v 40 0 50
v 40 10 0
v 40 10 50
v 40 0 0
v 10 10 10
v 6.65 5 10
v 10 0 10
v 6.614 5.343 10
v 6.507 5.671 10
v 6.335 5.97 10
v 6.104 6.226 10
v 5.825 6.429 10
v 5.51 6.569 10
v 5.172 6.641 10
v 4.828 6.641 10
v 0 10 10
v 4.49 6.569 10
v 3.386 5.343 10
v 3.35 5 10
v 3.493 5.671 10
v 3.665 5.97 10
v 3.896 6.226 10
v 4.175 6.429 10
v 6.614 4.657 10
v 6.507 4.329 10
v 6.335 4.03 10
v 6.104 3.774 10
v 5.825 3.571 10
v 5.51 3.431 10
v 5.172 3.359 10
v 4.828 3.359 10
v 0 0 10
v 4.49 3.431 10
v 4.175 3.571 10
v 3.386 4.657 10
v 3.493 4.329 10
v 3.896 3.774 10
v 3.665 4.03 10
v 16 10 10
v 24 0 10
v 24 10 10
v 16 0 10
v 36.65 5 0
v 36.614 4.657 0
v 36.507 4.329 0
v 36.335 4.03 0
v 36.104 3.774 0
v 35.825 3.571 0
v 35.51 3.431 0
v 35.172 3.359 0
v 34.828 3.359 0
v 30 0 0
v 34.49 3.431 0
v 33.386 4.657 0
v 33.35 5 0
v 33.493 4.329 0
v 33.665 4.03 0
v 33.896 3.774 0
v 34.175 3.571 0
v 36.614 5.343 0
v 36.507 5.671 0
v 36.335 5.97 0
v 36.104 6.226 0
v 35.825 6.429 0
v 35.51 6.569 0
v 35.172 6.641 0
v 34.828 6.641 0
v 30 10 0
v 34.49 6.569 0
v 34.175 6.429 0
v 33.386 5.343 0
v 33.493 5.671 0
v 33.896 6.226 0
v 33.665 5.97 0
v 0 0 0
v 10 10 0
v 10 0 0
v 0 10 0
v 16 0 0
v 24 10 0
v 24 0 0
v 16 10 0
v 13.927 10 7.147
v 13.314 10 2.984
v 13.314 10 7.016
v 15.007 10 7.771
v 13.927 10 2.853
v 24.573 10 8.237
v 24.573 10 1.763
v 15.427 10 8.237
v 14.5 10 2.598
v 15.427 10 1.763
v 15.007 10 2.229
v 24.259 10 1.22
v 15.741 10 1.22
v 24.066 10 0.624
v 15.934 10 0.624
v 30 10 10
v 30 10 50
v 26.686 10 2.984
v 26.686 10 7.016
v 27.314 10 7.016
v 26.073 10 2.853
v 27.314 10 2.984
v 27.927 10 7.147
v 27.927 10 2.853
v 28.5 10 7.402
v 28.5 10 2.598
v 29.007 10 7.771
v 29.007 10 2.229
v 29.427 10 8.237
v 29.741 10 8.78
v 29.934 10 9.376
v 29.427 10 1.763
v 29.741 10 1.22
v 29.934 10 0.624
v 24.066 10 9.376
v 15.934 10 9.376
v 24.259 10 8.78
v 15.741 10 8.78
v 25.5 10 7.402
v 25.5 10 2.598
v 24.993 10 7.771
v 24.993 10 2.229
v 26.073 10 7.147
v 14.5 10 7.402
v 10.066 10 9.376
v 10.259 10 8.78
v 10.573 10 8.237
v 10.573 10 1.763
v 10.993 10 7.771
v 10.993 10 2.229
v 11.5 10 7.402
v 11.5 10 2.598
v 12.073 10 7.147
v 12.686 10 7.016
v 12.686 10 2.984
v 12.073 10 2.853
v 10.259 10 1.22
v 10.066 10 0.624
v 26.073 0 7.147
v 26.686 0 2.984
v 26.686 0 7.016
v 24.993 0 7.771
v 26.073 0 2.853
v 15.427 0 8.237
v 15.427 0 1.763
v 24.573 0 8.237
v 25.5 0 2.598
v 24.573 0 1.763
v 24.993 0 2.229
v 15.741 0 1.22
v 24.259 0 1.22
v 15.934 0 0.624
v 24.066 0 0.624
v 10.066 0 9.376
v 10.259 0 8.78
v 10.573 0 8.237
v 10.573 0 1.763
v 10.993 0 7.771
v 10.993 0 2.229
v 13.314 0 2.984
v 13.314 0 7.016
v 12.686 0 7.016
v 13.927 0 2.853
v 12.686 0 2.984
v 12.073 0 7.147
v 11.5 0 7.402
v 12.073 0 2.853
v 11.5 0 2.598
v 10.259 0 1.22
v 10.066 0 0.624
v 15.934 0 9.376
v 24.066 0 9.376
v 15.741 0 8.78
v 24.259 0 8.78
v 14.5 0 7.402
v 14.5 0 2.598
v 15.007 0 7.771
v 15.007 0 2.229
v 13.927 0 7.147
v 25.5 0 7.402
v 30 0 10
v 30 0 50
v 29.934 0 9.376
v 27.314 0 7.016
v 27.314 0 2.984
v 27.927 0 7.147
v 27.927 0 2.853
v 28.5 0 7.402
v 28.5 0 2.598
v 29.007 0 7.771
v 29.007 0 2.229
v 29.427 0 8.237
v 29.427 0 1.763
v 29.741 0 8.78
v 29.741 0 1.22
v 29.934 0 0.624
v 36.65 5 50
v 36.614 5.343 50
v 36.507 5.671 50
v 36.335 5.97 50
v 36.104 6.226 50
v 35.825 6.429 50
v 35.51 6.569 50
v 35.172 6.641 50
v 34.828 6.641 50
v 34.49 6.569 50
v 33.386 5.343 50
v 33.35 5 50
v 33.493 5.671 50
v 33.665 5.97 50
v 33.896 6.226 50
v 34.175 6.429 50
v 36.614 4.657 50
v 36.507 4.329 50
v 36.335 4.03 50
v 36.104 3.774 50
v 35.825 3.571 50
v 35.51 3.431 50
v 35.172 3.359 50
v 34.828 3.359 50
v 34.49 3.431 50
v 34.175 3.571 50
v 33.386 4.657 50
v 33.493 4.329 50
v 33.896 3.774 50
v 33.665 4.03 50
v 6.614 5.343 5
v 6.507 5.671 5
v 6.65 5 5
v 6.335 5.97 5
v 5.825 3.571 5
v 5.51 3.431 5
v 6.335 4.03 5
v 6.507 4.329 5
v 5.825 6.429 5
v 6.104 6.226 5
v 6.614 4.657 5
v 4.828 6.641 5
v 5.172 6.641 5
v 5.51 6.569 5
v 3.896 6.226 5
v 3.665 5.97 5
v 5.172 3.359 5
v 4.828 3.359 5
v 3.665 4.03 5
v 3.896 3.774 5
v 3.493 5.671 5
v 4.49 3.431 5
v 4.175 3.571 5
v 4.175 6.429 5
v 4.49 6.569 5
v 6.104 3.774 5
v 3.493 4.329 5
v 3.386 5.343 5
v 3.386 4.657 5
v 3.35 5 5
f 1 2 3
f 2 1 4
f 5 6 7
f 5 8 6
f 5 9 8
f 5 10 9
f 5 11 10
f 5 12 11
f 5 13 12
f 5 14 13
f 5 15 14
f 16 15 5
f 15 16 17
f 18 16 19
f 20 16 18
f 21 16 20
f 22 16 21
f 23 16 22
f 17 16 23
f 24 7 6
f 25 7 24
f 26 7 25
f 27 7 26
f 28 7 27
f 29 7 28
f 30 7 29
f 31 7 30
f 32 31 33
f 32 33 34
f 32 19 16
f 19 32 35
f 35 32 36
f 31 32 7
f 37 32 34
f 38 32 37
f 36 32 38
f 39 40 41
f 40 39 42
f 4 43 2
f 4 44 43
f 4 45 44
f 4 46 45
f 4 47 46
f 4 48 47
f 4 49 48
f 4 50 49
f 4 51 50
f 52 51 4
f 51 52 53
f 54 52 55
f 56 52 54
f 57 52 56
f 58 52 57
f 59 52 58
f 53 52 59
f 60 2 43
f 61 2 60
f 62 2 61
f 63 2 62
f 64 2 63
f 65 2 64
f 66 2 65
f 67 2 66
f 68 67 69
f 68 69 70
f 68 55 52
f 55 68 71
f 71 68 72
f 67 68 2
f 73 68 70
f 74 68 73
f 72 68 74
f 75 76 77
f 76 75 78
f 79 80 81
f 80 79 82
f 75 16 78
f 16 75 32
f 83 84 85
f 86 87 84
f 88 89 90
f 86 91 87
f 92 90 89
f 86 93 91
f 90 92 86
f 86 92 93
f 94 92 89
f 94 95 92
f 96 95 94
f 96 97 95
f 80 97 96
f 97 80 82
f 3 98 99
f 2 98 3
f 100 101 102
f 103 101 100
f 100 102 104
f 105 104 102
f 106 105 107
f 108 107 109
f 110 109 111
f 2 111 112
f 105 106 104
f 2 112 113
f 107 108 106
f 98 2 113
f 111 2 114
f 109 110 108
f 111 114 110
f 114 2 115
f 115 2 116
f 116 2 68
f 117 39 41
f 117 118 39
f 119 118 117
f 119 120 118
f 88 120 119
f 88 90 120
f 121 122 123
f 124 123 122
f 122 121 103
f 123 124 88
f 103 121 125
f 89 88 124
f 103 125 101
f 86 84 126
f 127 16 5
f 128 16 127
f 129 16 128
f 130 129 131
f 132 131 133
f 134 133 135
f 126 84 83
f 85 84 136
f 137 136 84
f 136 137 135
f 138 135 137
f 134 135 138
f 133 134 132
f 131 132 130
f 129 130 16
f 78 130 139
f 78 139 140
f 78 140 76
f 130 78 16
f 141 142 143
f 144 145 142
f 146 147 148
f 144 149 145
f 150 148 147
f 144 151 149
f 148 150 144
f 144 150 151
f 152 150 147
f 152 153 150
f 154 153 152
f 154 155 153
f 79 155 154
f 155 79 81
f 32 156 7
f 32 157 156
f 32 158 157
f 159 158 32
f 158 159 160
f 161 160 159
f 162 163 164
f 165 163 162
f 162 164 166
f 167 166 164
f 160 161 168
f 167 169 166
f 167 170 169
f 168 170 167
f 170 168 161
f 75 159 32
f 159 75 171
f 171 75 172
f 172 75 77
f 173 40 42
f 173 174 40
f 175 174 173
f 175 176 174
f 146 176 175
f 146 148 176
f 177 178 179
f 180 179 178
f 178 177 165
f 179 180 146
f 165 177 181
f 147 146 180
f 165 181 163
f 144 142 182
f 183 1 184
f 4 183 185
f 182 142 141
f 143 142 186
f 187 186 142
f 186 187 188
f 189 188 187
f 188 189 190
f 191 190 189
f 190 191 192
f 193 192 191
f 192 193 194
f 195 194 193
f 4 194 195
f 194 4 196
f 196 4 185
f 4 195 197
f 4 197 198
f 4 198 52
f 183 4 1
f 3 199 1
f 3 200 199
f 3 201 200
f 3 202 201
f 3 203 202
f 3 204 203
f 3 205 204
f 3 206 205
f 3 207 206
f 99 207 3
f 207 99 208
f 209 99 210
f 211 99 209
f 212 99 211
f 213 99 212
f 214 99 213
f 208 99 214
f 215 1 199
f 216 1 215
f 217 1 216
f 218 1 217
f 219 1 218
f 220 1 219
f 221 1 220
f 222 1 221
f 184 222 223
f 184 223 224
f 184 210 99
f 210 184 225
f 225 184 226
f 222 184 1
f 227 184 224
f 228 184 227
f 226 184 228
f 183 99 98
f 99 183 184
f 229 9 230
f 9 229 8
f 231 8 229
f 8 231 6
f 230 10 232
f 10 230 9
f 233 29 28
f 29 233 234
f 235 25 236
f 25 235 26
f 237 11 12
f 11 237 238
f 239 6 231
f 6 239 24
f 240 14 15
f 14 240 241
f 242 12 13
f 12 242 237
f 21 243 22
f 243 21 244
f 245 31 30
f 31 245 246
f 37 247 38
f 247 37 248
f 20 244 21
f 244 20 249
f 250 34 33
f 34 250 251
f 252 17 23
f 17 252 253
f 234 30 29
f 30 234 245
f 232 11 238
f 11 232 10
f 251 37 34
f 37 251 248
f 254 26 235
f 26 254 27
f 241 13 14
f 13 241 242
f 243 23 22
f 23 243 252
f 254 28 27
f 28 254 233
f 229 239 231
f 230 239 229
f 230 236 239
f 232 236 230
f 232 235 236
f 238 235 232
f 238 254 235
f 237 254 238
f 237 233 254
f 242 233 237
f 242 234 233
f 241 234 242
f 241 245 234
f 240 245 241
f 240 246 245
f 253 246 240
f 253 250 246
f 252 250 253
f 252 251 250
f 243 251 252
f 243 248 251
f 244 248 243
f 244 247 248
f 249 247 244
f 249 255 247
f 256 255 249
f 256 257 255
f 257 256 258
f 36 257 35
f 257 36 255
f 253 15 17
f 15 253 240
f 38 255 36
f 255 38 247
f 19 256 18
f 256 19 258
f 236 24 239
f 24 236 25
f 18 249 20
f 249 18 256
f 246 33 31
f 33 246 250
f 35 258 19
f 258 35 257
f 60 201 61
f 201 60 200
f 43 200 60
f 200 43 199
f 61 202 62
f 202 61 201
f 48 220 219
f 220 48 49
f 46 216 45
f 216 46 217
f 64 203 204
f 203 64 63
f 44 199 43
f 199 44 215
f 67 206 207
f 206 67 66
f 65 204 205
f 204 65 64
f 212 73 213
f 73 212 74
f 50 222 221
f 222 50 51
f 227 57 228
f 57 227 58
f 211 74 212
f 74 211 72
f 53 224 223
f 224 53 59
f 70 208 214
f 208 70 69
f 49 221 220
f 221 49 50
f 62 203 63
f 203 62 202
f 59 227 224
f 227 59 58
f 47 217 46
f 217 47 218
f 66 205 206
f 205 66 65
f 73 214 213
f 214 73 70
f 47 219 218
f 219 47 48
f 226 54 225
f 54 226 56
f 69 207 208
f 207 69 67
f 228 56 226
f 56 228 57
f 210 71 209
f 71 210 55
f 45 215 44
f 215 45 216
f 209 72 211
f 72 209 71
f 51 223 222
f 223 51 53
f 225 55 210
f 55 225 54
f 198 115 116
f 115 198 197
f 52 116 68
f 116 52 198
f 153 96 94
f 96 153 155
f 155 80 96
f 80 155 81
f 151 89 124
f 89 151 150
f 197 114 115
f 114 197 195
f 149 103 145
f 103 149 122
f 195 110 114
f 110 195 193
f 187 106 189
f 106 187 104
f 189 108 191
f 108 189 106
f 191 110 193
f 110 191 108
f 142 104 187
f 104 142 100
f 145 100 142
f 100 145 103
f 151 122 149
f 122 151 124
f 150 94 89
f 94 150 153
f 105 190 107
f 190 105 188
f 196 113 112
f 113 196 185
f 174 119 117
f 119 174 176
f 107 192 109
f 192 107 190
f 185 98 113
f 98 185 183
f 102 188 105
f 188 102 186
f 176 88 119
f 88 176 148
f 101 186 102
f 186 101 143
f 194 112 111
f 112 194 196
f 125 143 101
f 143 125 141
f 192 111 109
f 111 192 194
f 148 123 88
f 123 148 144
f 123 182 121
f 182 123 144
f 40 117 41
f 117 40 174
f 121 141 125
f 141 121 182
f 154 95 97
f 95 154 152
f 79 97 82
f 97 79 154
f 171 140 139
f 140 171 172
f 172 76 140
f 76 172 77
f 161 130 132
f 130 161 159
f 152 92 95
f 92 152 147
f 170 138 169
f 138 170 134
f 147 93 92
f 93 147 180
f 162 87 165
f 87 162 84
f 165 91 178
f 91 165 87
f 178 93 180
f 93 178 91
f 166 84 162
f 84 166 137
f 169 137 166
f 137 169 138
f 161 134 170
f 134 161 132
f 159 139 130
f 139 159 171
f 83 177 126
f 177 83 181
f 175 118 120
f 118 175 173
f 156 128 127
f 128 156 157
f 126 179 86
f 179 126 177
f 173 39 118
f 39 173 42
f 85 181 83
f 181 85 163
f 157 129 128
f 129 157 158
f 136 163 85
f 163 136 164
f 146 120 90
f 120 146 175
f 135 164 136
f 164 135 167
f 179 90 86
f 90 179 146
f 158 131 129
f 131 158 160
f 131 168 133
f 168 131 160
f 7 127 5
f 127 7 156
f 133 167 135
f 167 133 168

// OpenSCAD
$fn=30;
legth=40;
width=10;
height=10;
difference(){
    union(){
        cube([legth,width,height]);
        translate([30,0,10])cube([legth-30,width,height*4]);
    }
    translate([5,width/2,5])cylinder(r=1.5*1.1,h=height*10);
    translate([35,width/2,20])cylinder(r=1.5*1.1,h=height*10,center=true);
    rotate([90,0,0])translate([27,0,0])cylinder(r=3,h=height*10,center=true);
    rotate([90,0,0])translate([27,10,0])cylinder(r=3,h=height*10,center=true);
    rotate([90,0,0])translate([13,0,0])cylinder(r=3,h=height*10,center=true);
    rotate([90,0,0])translate([13,10,0])cylinder(r=3,h=height*10,center=true);
}
